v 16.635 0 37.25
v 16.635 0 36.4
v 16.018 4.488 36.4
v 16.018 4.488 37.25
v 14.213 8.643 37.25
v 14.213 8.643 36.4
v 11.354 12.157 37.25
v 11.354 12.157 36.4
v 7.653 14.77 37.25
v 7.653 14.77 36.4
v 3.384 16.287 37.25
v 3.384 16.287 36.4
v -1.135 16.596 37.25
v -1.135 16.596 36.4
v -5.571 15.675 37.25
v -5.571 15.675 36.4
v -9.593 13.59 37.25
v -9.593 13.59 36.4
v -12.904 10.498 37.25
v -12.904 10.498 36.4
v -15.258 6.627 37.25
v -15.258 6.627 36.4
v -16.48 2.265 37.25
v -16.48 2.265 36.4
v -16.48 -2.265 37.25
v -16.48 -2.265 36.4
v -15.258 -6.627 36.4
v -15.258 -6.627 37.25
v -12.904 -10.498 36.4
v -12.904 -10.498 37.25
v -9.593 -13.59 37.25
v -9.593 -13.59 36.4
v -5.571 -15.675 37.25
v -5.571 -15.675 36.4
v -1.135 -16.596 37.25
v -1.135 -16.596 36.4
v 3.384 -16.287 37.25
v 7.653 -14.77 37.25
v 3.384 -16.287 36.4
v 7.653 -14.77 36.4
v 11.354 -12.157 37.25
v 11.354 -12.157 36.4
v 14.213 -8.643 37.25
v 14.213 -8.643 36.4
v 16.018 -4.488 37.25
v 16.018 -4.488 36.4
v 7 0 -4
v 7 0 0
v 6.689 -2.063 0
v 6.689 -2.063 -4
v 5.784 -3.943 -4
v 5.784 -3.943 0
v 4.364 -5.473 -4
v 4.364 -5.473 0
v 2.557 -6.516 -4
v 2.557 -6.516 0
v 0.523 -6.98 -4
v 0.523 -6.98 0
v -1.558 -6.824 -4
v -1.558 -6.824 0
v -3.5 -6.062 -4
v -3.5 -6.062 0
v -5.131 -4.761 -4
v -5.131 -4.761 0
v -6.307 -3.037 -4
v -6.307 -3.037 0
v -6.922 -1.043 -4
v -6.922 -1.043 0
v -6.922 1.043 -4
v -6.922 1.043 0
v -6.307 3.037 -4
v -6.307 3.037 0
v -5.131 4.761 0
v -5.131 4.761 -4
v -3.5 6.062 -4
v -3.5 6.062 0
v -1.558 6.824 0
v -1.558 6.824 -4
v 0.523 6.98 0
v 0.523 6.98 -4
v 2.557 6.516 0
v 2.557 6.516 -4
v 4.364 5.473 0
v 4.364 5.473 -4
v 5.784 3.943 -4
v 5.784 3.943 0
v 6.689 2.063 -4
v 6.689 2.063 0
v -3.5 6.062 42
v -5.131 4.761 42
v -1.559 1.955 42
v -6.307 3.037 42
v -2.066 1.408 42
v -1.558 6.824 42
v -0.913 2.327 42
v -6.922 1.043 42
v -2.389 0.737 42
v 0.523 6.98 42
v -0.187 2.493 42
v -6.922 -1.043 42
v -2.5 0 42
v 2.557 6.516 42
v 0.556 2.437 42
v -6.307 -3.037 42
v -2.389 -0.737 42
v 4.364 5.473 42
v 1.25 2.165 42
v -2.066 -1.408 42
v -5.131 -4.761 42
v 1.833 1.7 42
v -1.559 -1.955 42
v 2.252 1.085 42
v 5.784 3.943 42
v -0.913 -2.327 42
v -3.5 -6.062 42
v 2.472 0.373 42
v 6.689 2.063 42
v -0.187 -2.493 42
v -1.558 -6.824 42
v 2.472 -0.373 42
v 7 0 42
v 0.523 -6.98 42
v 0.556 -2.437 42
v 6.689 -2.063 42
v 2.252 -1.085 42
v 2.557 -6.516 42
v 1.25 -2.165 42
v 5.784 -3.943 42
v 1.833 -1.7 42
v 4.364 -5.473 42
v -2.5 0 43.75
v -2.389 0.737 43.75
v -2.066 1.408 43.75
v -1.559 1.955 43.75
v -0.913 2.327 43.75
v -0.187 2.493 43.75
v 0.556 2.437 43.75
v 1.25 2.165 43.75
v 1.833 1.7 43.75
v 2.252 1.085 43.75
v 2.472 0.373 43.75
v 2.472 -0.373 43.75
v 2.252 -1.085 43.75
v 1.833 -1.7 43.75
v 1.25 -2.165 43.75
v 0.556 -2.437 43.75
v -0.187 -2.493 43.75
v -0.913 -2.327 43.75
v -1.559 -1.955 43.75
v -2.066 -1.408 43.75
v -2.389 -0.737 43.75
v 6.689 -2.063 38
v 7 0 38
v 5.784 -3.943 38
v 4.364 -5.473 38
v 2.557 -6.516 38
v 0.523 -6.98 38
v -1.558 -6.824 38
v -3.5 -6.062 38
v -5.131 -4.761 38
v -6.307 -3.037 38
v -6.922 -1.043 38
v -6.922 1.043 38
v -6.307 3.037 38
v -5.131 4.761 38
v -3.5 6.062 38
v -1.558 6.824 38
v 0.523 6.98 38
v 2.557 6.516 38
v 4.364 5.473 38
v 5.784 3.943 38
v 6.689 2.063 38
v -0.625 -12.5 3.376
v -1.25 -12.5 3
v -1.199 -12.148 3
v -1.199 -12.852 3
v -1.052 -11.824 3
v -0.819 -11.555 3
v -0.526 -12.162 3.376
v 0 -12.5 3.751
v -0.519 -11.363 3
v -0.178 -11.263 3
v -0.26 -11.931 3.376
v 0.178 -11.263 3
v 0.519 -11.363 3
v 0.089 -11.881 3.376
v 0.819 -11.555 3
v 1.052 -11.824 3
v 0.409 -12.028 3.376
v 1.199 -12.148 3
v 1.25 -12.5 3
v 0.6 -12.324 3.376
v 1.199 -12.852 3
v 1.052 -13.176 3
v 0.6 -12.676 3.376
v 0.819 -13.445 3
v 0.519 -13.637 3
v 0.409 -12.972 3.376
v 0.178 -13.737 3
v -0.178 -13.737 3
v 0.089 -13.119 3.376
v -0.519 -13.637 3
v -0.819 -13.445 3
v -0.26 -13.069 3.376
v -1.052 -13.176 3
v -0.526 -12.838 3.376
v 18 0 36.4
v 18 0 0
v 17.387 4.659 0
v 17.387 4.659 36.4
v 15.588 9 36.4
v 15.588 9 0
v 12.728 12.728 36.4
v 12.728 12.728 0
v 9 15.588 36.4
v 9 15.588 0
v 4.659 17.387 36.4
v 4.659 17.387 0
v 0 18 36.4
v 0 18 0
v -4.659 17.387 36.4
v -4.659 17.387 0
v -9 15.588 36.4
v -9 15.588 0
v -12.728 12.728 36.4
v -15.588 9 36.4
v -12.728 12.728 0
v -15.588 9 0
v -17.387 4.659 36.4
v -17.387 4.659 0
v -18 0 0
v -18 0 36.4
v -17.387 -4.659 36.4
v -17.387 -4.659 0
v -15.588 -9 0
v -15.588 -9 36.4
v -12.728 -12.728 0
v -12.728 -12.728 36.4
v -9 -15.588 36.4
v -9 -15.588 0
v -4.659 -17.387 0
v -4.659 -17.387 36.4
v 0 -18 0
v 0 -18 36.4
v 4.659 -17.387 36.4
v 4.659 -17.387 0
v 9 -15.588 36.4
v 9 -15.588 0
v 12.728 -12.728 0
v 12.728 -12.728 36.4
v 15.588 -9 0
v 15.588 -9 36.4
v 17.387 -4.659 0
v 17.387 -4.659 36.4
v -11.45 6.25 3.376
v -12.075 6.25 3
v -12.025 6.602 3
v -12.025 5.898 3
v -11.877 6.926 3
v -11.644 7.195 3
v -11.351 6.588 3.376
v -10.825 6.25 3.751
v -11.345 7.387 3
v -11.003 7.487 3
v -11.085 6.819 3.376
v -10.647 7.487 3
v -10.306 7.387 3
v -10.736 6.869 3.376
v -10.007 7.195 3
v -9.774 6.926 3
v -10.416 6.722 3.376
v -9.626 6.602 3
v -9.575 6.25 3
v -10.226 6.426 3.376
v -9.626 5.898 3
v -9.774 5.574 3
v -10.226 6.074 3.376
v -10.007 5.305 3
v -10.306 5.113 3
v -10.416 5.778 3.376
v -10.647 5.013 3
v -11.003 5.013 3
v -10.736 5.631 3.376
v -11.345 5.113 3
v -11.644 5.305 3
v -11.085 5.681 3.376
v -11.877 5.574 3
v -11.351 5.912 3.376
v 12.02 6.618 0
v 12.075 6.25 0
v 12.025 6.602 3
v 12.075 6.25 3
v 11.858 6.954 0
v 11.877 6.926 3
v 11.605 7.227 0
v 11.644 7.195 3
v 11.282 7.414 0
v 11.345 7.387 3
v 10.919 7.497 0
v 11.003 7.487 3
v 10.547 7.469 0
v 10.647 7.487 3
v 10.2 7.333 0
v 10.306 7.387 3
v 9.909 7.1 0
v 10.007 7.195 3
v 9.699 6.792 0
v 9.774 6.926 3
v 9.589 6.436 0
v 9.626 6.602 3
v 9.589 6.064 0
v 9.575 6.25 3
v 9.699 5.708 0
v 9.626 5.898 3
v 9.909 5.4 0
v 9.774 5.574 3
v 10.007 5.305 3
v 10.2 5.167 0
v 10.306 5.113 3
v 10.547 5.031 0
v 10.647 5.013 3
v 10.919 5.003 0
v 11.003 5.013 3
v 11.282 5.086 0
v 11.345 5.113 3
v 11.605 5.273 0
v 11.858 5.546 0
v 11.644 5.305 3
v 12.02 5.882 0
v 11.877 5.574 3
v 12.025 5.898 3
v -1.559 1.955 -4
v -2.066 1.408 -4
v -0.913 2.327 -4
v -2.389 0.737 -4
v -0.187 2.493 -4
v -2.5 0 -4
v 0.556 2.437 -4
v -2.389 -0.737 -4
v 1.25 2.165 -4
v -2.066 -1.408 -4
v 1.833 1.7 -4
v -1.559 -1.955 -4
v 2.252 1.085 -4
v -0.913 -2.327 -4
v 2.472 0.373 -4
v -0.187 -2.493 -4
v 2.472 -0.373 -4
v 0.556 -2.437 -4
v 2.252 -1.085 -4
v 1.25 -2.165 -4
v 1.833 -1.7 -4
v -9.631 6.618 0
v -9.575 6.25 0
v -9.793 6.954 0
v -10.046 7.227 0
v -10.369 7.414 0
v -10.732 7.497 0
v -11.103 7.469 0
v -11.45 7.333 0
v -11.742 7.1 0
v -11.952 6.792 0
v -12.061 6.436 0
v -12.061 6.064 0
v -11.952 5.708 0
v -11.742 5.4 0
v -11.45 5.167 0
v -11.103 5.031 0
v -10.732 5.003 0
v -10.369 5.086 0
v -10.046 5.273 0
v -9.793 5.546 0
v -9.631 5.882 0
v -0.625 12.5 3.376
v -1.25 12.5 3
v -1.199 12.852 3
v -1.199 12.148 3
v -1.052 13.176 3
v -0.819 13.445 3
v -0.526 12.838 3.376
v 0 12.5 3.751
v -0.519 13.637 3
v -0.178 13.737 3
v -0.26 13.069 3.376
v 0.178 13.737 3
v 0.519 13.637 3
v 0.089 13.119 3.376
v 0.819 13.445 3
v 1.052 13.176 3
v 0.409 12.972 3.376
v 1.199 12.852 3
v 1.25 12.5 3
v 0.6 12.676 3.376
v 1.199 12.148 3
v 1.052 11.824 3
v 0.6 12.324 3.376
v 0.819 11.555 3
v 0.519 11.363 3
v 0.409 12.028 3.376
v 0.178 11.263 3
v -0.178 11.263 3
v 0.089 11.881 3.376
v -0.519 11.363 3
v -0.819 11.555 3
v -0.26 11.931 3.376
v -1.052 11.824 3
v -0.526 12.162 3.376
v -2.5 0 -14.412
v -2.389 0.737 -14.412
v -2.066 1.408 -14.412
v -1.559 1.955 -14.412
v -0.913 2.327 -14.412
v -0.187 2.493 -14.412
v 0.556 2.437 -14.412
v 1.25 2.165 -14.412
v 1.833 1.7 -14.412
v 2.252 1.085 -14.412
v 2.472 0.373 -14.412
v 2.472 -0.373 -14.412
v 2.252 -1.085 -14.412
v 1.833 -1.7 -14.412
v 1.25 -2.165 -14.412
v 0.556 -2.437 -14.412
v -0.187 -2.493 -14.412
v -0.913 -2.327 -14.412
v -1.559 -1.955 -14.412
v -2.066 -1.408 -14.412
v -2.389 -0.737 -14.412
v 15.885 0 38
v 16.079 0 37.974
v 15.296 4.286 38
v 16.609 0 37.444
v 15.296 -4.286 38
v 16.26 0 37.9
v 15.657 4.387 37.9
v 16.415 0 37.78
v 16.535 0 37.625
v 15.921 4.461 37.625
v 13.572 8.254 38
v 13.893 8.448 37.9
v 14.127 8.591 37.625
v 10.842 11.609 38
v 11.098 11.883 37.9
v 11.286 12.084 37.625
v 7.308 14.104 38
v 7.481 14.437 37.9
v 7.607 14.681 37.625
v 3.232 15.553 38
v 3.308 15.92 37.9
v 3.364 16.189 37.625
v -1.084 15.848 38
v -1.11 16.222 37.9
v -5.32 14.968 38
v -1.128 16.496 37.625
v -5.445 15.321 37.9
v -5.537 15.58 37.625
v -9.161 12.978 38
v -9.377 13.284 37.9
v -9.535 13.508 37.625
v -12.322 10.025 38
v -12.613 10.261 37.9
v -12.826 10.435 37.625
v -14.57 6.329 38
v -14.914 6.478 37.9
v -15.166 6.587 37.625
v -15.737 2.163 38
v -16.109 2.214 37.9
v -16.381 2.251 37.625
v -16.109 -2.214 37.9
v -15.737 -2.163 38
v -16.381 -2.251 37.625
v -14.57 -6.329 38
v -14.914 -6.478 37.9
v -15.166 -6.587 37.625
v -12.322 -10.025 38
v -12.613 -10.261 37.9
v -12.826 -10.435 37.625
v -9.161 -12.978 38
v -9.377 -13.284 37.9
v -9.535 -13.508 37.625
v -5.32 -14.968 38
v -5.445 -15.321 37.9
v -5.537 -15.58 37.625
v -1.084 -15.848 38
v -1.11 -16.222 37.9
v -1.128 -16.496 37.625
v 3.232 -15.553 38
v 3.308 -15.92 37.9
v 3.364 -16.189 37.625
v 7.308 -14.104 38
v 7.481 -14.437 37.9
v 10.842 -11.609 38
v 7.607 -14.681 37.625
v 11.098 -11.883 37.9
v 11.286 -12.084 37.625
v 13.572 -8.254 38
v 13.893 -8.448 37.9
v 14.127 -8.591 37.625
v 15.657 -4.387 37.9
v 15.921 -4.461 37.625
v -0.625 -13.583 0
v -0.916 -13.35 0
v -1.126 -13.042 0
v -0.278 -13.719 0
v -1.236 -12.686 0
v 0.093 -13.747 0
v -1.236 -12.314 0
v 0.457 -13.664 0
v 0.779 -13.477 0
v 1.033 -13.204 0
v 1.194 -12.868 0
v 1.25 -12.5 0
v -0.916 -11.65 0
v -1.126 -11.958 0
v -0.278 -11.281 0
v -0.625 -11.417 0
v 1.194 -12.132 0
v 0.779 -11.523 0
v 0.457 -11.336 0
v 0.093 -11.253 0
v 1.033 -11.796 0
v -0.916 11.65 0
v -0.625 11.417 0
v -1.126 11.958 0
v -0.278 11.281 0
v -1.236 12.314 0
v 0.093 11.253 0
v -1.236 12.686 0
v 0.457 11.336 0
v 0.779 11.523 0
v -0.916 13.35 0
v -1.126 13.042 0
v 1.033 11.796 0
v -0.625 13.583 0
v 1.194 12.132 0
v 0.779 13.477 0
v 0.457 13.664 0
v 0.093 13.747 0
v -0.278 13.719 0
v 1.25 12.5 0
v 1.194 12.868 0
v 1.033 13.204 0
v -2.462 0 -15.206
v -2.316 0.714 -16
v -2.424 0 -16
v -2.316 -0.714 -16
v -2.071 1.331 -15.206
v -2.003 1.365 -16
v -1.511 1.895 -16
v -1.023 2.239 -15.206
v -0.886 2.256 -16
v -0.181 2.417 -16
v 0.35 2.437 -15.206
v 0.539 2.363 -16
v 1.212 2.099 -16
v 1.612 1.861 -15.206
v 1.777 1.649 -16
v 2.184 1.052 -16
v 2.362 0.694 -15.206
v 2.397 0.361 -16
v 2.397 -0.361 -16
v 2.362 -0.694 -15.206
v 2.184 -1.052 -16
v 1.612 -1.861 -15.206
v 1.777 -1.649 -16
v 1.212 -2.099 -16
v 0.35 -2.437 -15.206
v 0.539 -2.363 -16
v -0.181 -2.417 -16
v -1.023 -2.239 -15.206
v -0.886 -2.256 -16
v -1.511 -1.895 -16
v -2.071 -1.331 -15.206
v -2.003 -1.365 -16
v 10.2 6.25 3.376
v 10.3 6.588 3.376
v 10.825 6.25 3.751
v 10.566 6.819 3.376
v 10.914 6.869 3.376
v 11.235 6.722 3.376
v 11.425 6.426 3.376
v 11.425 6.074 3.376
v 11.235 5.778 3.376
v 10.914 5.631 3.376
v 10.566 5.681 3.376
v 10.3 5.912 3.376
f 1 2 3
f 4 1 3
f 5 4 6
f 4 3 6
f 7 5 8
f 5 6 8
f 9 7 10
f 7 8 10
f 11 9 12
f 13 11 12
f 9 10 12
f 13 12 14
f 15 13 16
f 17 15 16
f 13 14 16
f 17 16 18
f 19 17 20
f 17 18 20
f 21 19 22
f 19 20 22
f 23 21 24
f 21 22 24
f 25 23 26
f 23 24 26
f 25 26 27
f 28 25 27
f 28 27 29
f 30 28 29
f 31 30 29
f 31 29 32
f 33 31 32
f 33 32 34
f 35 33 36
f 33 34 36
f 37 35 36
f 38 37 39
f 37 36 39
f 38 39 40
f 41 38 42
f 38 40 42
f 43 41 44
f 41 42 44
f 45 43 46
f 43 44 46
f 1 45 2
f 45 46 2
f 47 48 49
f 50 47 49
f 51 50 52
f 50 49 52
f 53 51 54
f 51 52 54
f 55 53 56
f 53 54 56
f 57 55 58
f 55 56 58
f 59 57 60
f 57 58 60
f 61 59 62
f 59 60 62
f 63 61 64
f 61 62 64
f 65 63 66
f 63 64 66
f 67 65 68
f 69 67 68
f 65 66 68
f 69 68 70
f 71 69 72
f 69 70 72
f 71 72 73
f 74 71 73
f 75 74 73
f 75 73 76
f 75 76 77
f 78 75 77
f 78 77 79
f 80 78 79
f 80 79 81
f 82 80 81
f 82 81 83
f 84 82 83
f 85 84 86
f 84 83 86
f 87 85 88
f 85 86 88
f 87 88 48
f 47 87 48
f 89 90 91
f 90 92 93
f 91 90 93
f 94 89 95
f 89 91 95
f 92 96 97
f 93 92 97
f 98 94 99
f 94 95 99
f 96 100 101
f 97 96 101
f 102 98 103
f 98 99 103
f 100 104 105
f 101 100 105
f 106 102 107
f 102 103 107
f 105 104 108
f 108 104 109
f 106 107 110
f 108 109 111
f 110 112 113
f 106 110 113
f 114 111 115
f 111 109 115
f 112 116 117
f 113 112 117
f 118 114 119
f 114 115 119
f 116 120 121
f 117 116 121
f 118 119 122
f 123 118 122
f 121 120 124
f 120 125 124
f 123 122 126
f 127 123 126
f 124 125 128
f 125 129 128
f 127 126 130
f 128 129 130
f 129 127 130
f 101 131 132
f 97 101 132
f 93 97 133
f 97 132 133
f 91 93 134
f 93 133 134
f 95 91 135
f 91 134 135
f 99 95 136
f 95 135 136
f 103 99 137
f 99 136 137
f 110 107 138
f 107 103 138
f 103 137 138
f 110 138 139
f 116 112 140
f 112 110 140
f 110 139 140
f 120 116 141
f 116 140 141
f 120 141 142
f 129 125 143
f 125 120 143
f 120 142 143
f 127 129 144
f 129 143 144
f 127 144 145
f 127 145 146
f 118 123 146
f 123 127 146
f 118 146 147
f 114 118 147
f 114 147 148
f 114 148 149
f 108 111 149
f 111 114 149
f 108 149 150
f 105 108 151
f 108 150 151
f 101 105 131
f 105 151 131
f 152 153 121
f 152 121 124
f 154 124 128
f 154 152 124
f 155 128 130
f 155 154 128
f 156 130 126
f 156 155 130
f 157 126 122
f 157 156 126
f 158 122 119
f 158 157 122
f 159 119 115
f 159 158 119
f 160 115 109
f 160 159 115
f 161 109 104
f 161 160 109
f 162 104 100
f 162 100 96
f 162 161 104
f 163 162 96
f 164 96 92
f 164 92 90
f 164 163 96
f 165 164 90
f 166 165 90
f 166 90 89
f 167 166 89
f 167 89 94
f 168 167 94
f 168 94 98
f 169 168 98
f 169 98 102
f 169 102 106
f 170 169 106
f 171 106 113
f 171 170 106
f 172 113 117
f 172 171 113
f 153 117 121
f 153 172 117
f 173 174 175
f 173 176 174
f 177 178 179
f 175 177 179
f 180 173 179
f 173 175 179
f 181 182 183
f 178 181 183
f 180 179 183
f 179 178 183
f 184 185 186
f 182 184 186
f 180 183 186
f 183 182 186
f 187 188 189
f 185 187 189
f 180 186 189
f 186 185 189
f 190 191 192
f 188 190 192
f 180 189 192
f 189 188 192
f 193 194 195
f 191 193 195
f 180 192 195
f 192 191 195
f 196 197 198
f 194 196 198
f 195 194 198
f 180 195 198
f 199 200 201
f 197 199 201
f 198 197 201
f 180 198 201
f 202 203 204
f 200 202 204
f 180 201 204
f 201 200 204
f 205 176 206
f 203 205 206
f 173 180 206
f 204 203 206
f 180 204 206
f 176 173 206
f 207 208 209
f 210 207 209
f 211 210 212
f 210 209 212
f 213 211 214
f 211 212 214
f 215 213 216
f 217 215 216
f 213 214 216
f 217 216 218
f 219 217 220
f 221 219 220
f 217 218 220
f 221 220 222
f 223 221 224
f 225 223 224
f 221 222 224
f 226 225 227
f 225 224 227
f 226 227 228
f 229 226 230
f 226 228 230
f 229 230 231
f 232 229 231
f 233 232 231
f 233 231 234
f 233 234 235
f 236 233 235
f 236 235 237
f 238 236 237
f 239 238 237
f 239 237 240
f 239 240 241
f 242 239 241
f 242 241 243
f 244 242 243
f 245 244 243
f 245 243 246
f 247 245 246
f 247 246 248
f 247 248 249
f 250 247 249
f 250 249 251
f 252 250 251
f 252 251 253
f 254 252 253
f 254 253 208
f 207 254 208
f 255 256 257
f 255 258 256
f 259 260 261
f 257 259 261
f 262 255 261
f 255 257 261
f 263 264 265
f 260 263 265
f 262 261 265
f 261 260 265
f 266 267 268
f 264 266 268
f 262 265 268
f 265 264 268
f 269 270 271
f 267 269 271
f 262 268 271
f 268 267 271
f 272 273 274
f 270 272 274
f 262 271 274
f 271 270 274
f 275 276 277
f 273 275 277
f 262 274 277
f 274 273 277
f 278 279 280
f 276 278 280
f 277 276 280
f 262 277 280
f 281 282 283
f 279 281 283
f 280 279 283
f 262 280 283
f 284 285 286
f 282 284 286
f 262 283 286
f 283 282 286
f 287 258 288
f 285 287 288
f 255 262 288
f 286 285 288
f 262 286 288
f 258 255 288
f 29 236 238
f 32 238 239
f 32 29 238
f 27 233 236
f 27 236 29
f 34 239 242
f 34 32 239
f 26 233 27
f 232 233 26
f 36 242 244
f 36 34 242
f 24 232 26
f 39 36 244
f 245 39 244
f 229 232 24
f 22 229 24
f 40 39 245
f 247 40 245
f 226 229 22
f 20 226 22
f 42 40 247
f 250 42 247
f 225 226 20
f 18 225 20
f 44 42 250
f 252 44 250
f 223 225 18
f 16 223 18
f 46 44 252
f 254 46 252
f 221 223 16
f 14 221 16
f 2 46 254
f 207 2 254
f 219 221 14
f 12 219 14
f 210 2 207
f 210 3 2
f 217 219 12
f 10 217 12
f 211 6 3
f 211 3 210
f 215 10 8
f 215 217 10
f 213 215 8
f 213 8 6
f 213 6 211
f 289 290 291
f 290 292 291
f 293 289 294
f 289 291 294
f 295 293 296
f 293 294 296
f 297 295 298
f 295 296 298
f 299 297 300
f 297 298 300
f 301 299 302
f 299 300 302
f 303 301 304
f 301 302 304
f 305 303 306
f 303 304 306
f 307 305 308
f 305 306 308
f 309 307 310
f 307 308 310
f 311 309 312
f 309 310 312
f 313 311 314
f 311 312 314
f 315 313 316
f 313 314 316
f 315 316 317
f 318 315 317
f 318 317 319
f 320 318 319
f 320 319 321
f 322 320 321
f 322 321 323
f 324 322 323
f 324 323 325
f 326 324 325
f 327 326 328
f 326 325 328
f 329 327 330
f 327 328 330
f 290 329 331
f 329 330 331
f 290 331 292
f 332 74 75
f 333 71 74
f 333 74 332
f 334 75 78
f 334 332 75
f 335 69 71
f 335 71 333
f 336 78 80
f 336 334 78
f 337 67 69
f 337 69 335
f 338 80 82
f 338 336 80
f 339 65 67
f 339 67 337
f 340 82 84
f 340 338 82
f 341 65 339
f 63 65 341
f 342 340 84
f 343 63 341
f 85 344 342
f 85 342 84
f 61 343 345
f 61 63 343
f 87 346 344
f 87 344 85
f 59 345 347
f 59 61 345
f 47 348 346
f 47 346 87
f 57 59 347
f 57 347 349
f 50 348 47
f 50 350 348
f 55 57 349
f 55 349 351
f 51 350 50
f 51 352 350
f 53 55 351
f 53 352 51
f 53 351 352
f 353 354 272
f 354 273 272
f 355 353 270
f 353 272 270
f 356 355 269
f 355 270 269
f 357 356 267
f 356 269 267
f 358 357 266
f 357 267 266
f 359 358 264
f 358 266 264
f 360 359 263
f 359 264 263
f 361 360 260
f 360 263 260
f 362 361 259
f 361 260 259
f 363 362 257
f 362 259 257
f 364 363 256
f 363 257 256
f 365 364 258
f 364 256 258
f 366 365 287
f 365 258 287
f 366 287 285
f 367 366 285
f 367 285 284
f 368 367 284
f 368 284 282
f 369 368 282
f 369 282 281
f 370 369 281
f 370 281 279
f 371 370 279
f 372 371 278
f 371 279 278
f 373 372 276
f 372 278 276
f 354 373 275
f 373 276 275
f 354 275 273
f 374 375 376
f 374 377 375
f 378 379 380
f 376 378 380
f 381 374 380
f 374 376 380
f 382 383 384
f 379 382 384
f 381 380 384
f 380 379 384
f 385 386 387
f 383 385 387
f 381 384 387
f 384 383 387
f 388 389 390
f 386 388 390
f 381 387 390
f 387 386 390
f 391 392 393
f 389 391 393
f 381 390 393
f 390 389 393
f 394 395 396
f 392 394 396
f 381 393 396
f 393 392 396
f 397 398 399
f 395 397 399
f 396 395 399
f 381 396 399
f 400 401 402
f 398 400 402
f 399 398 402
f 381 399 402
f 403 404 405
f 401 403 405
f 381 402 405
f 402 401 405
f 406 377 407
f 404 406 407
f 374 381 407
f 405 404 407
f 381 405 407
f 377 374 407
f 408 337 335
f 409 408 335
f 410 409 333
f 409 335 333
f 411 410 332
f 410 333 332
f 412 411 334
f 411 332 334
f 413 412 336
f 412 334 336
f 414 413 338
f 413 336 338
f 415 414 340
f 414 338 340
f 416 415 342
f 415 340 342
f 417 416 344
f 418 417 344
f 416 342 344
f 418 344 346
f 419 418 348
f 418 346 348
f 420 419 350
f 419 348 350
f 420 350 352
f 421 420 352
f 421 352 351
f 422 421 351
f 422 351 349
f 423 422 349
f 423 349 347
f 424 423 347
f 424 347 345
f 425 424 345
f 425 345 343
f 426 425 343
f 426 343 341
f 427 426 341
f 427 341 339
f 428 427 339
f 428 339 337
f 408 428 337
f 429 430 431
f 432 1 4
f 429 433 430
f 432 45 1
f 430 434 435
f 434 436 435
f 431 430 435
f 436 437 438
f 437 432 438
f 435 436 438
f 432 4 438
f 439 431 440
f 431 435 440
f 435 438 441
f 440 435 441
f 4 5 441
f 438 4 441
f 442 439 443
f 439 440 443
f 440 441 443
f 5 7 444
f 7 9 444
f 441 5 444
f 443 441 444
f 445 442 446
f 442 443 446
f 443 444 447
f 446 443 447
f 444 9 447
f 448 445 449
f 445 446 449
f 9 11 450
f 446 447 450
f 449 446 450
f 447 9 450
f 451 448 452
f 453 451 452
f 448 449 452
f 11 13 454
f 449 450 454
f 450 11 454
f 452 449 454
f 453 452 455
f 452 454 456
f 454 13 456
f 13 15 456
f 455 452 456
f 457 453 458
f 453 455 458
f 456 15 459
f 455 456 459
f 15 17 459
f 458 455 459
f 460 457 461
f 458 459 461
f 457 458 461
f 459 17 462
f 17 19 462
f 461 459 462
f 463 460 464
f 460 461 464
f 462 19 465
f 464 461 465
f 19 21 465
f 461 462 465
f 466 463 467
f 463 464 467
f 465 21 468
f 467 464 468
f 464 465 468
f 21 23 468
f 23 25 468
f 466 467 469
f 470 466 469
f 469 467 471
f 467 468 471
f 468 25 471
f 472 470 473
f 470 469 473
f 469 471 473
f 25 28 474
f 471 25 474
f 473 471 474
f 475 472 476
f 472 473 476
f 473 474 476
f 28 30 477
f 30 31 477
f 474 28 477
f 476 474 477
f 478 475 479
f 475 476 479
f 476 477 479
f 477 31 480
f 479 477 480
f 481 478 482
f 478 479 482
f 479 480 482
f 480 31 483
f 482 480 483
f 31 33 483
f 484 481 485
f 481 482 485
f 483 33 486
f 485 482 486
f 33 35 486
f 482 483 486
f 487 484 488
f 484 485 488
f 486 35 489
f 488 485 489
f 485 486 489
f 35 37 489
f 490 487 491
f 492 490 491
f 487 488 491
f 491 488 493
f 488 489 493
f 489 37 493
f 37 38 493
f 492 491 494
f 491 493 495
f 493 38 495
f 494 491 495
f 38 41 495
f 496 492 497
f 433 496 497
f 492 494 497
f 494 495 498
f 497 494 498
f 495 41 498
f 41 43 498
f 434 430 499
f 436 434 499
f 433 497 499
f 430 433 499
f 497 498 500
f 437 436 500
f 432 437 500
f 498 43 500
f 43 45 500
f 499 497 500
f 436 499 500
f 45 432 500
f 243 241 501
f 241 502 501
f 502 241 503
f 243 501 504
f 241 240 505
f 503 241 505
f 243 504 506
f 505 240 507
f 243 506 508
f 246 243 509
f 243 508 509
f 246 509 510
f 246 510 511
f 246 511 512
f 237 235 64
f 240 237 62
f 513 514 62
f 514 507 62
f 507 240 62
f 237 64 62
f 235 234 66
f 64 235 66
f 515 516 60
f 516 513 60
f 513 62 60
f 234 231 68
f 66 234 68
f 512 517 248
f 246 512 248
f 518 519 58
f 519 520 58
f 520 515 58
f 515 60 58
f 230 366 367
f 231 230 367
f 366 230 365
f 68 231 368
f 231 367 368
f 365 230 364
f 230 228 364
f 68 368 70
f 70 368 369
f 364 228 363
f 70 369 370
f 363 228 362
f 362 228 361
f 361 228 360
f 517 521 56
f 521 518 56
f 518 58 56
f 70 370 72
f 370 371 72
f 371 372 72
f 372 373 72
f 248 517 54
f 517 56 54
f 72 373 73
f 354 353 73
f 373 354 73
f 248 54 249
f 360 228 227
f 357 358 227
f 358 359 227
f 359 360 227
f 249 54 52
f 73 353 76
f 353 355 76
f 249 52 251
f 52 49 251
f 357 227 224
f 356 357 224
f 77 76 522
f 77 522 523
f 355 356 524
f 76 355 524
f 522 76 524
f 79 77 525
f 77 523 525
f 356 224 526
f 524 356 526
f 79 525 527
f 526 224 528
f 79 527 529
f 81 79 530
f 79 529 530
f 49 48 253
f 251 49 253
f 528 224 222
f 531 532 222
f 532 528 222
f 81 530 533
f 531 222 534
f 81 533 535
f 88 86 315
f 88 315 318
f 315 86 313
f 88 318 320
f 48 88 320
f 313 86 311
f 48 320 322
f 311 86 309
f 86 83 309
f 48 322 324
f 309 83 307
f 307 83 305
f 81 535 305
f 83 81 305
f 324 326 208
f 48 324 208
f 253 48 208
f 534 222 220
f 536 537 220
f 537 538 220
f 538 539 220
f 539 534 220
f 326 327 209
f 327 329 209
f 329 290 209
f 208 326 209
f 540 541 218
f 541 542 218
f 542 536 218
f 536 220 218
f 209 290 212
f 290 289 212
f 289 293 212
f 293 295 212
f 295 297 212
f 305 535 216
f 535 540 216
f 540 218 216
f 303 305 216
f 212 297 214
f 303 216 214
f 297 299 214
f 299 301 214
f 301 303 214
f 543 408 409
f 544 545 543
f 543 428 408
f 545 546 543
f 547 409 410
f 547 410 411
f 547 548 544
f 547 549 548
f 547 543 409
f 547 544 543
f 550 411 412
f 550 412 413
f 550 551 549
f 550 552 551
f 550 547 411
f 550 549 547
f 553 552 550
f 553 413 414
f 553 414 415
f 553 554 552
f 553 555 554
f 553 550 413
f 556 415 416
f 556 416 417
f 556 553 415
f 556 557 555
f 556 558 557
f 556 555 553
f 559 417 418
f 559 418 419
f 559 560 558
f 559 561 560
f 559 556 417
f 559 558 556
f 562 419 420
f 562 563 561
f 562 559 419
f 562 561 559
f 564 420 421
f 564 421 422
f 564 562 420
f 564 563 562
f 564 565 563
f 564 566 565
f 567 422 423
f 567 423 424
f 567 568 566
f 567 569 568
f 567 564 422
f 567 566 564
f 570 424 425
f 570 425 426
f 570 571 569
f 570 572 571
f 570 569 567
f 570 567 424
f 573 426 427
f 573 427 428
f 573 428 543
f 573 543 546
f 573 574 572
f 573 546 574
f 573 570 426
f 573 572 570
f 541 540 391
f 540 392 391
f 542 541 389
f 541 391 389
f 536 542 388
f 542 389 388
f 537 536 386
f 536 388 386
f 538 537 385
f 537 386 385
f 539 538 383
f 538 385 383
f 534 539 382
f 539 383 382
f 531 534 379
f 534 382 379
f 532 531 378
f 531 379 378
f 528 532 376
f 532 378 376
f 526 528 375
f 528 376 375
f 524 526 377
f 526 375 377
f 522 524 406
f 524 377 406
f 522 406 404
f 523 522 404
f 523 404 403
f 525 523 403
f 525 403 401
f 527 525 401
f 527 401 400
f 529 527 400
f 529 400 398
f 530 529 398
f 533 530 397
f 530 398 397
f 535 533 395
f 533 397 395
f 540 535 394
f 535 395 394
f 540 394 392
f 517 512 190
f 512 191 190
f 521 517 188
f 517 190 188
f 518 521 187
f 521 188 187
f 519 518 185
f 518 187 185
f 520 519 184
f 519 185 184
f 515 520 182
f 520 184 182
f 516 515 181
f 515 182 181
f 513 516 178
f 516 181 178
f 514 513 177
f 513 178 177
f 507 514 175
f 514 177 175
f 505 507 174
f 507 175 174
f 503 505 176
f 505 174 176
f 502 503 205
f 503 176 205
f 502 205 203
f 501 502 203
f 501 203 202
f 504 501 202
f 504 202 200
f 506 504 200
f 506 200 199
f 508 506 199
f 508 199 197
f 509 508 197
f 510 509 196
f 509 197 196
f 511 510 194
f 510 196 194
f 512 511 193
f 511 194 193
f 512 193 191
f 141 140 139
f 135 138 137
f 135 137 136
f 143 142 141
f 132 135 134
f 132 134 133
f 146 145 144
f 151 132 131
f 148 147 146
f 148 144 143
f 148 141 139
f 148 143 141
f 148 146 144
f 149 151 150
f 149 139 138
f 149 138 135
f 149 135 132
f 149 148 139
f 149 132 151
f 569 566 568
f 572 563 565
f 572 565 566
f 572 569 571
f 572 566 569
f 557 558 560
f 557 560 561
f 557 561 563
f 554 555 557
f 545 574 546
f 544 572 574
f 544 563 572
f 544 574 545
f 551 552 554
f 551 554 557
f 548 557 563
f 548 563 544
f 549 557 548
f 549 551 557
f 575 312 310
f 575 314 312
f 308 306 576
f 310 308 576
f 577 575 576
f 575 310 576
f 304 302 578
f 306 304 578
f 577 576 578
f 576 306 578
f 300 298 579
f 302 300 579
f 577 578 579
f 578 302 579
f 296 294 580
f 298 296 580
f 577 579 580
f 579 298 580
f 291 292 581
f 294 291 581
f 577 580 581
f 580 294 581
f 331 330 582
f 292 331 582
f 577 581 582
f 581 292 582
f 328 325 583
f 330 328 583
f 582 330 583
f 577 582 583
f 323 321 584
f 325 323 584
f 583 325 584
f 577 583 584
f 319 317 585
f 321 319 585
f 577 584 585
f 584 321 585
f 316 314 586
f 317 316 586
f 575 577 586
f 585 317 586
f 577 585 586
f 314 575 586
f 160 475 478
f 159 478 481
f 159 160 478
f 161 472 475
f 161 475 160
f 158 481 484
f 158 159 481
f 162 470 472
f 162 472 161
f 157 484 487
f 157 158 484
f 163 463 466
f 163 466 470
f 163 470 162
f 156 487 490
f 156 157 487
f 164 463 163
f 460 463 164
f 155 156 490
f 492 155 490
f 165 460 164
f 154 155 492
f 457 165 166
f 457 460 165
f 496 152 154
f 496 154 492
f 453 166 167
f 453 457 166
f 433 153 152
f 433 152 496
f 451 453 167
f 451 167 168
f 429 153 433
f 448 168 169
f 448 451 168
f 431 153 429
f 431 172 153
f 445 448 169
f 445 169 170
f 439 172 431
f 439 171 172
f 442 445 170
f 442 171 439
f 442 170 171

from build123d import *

# Parameters (mm, degrees)
SKETCH1_R                 = 18
BOSS_EXTRUDE1_DEPTH       = 38
BOSS_EXTRUDE2_DEPTH       = 16
BOSS_EXTRUDE2_DEPTH_BACK  = 45
SKETCH2_R                 = 2.5
SKETCH3_R                 = 7
BOSS_EXTRUDE3_DEPTH       = 4
M3X0_5_TAPPED_HOLE1_D     = 2.5
M3X0_5_TAPPED_HOLE1_DEPTH = 3
M3X0_5_TAPPED_HOLE1_TIP   = 0.751075774
SKETCH6_R                 = 2.5
CUT_EXTRUDE1_DEPTH        = 1.25
CUT_EXTRUDE2_START        = -1.6
SKETCH7_R                 = 18
SKETCH7_R_2               = 16.635
CUT_EXTRUDE2_DEPTH        = 1.6
FILLET1_R                 = 0.75


with BuildPart() as part:
    # Sketch1 → Boss-Extrude1 (new body)
    with BuildSketch(Plane.XY):
        Circle(SKETCH1_R)
    extrude(amount=BOSS_EXTRUDE1_DEPTH)

    # Sketch2 → Boss-Extrude2 (add, two sides: drawn at the far end of the back side and taken through both)
    with BuildSketch(Plane(origin=(0, 0, 0), x_dir=(-1, 0, 0), z_dir=(0, 0, -1)).offset(-BOSS_EXTRUDE2_DEPTH_BACK)):
        Circle(SKETCH2_R)
    extrude(amount=BOSS_EXTRUDE2_DEPTH + BOSS_EXTRUDE2_DEPTH_BACK)

    # Sketch3 → Boss-Extrude3 (add)
    with BuildSketch(Plane(origin=(0, 0, 0), x_dir=(-1, 0, 0), z_dir=(0, 0, -1))):
        with Locations(Location((0, 0, 0), (0, 0, 180))):
            Circle(SKETCH3_R)
    boss_extrude3 = extrude(amount=BOSS_EXTRUDE3_DEPTH)

    # M3x0.5 Tapped Hole1
    with Locations(Plane(origin=(0, 0, 0), x_dir=(-1, 0, 0), z_dir=(0, 0, -1))):
        with Locations((0, 12.5), (-10.825317547, 6.25), (0, -12.5), (10.825317547, 6.25)):
            Hole(M3X0_5_TAPPED_HOLE1_D / 2, depth=M3X0_5_TAPPED_HOLE1_DEPTH)
            with Locations((0, 0, -(M3X0_5_TAPPED_HOLE1_DEPTH + M3X0_5_TAPPED_HOLE1_TIP / 2))):  # 118° drill point
                Cone(0, M3X0_5_TAPPED_HOLE1_D / 2, M3X0_5_TAPPED_HOLE1_TIP, mode=Mode.SUBTRACT)

    # Sketch6 → Cut-Extrude1 (cut)
    with BuildSketch(Plane.XY.offset(45)):
        with Locations(Location((0, 0, 0), (0, 0, 180))):
            Circle(SKETCH6_R)
    extrude(amount=-CUT_EXTRUDE1_DEPTH, mode=Mode.SUBTRACT)

    # Mirror1: Boss-Extrude3 across plane
    add(boss_extrude3.mirror(Plane(origin=(0, 0, 19), x_dir=(1, 0, 0), z_dir=(0, 0, -1))))

    # Sketch7 → Cut-Extrude2 (cut)
    with BuildSketch(Plane.XY.offset(38).offset(CUT_EXTRUDE2_START)):
        Circle(SKETCH7_R)
        Circle(SKETCH7_R_2, mode=Mode.SUBTRACT)
    extrude(amount=CUT_EXTRUDE2_DEPTH, mode=Mode.SUBTRACT)

    # Fillet1
    fillet1_edges = [part.edges().sort_by_distance(p)[0] for p in [
        (-16.635, 0, 38),
    ]]
    fillet(fillet1_edges, radius=FILLET1_R)

    # Sketch8 → Cut-Revolve1 (revolve, cut)
    with BuildSketch(Plane(origin=(0, 0, 0), x_dir=(1, 0, 0), z_dir=(0, 1, 0)), mode=Mode.PRIVATE) as cut_revolve1_sk:
        Polygon((2.5, 16), (2.5, 14.4125), (2.4238, 16), align=None)
    revolve(cut_revolve1_sk.sketch.rotate(Axis((0, 0, -16), (0, 0, -1)), 180), axis=Axis((0, 0, -16), (0, 0, -1)), mode=Mode.SUBTRACT)


solid = part.part
